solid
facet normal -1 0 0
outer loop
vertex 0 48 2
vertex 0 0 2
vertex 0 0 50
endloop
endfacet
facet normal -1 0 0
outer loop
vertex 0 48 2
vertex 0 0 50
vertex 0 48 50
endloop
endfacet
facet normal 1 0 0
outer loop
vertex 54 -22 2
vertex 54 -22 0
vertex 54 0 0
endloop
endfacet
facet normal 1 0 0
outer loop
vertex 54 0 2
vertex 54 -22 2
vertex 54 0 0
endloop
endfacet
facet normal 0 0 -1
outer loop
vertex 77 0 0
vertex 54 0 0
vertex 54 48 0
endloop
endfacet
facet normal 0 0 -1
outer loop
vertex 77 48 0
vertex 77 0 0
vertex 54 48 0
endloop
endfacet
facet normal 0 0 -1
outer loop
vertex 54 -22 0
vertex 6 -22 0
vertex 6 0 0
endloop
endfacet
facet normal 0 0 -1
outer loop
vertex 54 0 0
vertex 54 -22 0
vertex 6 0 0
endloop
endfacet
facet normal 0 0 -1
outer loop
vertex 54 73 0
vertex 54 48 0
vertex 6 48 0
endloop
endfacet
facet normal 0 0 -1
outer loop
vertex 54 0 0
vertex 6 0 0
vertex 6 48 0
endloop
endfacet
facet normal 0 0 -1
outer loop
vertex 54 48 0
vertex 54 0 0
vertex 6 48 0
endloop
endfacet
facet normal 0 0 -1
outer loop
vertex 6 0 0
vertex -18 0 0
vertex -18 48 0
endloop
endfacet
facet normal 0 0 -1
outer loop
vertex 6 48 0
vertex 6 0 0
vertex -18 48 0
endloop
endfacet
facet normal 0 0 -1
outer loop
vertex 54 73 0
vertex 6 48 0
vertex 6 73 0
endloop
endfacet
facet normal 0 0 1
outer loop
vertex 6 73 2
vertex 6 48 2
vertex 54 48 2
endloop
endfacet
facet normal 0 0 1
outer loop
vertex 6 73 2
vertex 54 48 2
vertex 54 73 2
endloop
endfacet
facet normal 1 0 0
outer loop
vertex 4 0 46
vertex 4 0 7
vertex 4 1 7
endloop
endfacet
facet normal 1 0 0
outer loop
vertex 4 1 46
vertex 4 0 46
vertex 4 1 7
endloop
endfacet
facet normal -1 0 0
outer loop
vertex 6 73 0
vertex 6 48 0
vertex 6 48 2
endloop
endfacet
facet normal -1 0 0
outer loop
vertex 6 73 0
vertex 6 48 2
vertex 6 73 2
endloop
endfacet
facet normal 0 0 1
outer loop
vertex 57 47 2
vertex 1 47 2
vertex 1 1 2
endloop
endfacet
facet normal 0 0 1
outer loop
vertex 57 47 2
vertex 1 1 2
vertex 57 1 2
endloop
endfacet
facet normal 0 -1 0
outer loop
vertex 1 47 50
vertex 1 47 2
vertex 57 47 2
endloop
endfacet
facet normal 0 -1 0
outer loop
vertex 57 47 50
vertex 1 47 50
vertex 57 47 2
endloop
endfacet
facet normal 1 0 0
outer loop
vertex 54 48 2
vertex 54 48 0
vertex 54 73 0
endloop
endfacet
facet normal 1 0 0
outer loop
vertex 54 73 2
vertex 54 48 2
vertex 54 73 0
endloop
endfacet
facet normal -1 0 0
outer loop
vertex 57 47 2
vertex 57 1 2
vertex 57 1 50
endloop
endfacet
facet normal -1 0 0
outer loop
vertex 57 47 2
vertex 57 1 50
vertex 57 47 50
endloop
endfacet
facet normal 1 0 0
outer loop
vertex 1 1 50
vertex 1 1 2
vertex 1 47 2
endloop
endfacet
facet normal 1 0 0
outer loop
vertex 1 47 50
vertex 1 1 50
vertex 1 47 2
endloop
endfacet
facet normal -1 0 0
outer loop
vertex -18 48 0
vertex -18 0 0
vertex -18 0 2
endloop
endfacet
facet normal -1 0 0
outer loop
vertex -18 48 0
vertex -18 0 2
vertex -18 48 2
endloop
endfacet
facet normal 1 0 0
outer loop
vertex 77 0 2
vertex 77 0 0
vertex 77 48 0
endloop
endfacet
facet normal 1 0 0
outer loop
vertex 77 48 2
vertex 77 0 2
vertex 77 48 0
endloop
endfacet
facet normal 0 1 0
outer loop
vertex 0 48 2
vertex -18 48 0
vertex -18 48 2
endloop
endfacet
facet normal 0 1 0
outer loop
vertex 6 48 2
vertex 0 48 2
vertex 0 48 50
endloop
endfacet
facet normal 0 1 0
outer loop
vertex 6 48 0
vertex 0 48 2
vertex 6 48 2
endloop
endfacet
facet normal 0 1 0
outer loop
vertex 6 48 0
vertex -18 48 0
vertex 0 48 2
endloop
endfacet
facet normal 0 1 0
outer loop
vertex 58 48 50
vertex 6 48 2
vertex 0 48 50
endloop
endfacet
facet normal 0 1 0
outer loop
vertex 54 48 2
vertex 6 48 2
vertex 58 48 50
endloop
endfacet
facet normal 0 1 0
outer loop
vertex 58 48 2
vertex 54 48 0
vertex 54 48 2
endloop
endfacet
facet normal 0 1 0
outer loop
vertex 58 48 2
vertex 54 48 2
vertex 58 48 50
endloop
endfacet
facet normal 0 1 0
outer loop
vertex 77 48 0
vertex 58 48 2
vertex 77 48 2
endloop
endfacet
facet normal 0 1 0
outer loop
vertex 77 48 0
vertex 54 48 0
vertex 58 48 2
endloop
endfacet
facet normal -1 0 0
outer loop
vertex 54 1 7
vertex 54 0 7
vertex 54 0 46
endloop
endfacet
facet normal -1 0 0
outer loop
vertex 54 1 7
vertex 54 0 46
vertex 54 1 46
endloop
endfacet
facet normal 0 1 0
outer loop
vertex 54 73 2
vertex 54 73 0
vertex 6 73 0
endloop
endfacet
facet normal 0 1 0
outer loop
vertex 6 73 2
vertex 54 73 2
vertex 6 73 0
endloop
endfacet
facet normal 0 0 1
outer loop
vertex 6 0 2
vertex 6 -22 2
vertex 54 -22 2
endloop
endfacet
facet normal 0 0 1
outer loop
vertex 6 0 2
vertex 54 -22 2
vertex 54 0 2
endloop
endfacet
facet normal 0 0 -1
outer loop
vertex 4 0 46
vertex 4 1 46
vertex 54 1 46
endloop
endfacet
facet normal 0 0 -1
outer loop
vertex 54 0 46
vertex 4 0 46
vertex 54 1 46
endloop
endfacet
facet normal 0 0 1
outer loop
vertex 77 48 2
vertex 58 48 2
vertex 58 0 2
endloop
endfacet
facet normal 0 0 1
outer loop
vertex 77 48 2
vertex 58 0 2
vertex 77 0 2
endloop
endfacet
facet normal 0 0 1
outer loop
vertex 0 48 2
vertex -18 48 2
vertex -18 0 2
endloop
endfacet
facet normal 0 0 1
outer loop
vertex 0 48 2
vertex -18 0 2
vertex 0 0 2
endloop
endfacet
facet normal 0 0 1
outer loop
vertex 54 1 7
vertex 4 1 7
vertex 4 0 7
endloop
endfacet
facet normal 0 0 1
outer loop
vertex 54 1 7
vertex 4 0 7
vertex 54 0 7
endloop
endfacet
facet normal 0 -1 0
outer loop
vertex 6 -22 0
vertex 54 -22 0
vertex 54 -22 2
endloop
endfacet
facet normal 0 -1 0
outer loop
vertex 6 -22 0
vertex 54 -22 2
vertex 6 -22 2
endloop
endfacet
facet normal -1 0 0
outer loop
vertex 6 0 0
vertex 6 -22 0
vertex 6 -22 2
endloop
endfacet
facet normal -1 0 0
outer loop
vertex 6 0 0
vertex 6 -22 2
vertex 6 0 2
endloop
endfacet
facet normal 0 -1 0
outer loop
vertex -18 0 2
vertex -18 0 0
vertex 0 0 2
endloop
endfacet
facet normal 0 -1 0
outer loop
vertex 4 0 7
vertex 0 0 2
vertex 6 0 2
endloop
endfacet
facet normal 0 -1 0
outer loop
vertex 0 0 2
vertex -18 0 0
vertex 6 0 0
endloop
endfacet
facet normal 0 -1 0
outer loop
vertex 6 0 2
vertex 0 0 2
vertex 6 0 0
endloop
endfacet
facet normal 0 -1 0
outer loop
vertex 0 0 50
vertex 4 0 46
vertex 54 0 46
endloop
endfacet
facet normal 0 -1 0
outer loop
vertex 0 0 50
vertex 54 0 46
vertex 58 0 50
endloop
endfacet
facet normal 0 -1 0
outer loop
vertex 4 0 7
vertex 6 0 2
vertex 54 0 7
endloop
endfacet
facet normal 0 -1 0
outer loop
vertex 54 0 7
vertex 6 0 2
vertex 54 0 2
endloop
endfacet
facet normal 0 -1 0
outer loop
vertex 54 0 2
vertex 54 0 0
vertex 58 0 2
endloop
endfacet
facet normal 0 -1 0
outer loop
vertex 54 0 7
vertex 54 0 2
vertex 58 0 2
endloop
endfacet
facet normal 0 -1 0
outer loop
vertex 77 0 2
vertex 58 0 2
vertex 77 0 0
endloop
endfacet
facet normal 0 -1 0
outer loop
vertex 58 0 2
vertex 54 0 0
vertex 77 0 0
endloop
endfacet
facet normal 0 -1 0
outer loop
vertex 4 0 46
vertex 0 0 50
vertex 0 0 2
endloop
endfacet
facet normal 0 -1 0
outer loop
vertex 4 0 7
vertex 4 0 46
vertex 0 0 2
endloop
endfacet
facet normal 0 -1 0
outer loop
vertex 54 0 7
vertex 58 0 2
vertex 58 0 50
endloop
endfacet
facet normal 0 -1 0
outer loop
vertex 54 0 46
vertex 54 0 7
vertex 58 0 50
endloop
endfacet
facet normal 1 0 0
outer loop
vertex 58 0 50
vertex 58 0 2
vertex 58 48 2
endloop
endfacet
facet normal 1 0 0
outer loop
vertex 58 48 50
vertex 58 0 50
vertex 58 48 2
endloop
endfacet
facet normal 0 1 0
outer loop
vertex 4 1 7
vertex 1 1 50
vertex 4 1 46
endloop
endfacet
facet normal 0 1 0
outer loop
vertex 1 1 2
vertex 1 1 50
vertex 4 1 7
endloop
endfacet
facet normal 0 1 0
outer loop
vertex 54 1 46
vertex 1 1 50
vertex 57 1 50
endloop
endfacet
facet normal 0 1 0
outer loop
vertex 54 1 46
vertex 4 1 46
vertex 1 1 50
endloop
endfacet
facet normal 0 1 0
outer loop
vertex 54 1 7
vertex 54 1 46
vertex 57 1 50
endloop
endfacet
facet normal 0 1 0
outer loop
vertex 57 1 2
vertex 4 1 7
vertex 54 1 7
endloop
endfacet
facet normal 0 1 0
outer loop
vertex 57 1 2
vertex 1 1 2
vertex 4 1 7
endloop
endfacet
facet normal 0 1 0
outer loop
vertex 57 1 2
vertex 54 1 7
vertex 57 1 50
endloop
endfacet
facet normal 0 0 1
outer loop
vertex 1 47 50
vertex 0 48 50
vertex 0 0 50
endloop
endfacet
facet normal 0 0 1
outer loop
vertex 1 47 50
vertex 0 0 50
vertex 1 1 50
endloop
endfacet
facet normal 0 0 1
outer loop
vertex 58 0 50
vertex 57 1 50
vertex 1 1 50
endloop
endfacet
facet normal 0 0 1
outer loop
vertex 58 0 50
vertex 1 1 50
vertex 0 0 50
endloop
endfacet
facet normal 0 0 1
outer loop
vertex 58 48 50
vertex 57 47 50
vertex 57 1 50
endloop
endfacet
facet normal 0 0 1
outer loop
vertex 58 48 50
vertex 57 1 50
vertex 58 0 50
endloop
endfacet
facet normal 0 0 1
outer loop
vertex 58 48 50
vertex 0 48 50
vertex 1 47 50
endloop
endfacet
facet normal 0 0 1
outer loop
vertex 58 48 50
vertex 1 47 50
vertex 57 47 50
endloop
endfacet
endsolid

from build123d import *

# Parameters (mm, degrees)
BOX003_W               = 95
BOX003_H               = 48
BOX003_DEPTH           = 2
BOX004_W               = 95
BOX004_H               = 48
BOX004_DEPTH           = 2
BOX004_PLACEMENT_ANGLE = 90
BOX002_W               = 50
BOX002_H               = 13
BOX002_DEPTH           = 39
BOX001_W               = 56
BOX001_H               = 46
BOX001_DEPTH           = 59
BOX_W                  = 58
BOX_H                  = 48
BOX_DEPTH              = 50


with BuildPart() as cube003:
    # Box003 → Box003 (new body)
    with BuildSketch(Plane(origin=(-18, 0, 0), x_dir=(1, 0, 0), z_dir=(0, 0, 1))):
        with Locations((47.5, 24)):
            Rectangle(BOX003_W, BOX003_H)
    extrude(amount=BOX003_DEPTH)


with BuildPart() as cube004:
    # Box004 → Box004 (new body)
    with BuildSketch(Plane.XY):
        with Locations((47.5, 24)):
            Rectangle(BOX004_W, BOX004_H)
    extrude(amount=BOX004_DEPTH)


with BuildPart() as cube004_1:
    # Box004 placement: moved
    add(cube004.part.moved(Location((54, -22, 0))).rotate(Axis((54, -22, 0), (0, 0, 1)), BOX004_PLACEMENT_ANGLE))


with BuildPart() as cube002:
    # Box002 → Box002 (new body)
    with BuildSketch(Plane(origin=(4, -2, 7), x_dir=(1, 0, 0), z_dir=(0, 0, 1))):
        with Locations((25, 6.5)):
            Rectangle(BOX002_W, BOX002_H)
    extrude(amount=BOX002_DEPTH)


with BuildPart() as cube001:
    # Box001 → Box001 (new body)
    with BuildSketch(Plane(origin=(1, 1, 2), x_dir=(1, 0, 0), z_dir=(0, 0, 1))):
        with Locations((28, 23)):
            Rectangle(BOX001_W, BOX001_H)
    extrude(amount=BOX001_DEPTH)


with BuildPart() as fusion:
    # Box → Box (new body)
    with BuildSketch(Plane.XY):
        with Locations((29, 24)):
            Rectangle(BOX_W, BOX_H)
    extrude(amount=BOX_DEPTH)

    # Cut: cut Cube001
    add(cube001.part, mode=Mode.SUBTRACT)

    # Cut001: cut Cube002
    add(cube002.part, mode=Mode.SUBTRACT)

    # Fusion: union Cube003, Cube004
    add(cube003.part)
    add(cube004_1.part)


solid = fusion.part
